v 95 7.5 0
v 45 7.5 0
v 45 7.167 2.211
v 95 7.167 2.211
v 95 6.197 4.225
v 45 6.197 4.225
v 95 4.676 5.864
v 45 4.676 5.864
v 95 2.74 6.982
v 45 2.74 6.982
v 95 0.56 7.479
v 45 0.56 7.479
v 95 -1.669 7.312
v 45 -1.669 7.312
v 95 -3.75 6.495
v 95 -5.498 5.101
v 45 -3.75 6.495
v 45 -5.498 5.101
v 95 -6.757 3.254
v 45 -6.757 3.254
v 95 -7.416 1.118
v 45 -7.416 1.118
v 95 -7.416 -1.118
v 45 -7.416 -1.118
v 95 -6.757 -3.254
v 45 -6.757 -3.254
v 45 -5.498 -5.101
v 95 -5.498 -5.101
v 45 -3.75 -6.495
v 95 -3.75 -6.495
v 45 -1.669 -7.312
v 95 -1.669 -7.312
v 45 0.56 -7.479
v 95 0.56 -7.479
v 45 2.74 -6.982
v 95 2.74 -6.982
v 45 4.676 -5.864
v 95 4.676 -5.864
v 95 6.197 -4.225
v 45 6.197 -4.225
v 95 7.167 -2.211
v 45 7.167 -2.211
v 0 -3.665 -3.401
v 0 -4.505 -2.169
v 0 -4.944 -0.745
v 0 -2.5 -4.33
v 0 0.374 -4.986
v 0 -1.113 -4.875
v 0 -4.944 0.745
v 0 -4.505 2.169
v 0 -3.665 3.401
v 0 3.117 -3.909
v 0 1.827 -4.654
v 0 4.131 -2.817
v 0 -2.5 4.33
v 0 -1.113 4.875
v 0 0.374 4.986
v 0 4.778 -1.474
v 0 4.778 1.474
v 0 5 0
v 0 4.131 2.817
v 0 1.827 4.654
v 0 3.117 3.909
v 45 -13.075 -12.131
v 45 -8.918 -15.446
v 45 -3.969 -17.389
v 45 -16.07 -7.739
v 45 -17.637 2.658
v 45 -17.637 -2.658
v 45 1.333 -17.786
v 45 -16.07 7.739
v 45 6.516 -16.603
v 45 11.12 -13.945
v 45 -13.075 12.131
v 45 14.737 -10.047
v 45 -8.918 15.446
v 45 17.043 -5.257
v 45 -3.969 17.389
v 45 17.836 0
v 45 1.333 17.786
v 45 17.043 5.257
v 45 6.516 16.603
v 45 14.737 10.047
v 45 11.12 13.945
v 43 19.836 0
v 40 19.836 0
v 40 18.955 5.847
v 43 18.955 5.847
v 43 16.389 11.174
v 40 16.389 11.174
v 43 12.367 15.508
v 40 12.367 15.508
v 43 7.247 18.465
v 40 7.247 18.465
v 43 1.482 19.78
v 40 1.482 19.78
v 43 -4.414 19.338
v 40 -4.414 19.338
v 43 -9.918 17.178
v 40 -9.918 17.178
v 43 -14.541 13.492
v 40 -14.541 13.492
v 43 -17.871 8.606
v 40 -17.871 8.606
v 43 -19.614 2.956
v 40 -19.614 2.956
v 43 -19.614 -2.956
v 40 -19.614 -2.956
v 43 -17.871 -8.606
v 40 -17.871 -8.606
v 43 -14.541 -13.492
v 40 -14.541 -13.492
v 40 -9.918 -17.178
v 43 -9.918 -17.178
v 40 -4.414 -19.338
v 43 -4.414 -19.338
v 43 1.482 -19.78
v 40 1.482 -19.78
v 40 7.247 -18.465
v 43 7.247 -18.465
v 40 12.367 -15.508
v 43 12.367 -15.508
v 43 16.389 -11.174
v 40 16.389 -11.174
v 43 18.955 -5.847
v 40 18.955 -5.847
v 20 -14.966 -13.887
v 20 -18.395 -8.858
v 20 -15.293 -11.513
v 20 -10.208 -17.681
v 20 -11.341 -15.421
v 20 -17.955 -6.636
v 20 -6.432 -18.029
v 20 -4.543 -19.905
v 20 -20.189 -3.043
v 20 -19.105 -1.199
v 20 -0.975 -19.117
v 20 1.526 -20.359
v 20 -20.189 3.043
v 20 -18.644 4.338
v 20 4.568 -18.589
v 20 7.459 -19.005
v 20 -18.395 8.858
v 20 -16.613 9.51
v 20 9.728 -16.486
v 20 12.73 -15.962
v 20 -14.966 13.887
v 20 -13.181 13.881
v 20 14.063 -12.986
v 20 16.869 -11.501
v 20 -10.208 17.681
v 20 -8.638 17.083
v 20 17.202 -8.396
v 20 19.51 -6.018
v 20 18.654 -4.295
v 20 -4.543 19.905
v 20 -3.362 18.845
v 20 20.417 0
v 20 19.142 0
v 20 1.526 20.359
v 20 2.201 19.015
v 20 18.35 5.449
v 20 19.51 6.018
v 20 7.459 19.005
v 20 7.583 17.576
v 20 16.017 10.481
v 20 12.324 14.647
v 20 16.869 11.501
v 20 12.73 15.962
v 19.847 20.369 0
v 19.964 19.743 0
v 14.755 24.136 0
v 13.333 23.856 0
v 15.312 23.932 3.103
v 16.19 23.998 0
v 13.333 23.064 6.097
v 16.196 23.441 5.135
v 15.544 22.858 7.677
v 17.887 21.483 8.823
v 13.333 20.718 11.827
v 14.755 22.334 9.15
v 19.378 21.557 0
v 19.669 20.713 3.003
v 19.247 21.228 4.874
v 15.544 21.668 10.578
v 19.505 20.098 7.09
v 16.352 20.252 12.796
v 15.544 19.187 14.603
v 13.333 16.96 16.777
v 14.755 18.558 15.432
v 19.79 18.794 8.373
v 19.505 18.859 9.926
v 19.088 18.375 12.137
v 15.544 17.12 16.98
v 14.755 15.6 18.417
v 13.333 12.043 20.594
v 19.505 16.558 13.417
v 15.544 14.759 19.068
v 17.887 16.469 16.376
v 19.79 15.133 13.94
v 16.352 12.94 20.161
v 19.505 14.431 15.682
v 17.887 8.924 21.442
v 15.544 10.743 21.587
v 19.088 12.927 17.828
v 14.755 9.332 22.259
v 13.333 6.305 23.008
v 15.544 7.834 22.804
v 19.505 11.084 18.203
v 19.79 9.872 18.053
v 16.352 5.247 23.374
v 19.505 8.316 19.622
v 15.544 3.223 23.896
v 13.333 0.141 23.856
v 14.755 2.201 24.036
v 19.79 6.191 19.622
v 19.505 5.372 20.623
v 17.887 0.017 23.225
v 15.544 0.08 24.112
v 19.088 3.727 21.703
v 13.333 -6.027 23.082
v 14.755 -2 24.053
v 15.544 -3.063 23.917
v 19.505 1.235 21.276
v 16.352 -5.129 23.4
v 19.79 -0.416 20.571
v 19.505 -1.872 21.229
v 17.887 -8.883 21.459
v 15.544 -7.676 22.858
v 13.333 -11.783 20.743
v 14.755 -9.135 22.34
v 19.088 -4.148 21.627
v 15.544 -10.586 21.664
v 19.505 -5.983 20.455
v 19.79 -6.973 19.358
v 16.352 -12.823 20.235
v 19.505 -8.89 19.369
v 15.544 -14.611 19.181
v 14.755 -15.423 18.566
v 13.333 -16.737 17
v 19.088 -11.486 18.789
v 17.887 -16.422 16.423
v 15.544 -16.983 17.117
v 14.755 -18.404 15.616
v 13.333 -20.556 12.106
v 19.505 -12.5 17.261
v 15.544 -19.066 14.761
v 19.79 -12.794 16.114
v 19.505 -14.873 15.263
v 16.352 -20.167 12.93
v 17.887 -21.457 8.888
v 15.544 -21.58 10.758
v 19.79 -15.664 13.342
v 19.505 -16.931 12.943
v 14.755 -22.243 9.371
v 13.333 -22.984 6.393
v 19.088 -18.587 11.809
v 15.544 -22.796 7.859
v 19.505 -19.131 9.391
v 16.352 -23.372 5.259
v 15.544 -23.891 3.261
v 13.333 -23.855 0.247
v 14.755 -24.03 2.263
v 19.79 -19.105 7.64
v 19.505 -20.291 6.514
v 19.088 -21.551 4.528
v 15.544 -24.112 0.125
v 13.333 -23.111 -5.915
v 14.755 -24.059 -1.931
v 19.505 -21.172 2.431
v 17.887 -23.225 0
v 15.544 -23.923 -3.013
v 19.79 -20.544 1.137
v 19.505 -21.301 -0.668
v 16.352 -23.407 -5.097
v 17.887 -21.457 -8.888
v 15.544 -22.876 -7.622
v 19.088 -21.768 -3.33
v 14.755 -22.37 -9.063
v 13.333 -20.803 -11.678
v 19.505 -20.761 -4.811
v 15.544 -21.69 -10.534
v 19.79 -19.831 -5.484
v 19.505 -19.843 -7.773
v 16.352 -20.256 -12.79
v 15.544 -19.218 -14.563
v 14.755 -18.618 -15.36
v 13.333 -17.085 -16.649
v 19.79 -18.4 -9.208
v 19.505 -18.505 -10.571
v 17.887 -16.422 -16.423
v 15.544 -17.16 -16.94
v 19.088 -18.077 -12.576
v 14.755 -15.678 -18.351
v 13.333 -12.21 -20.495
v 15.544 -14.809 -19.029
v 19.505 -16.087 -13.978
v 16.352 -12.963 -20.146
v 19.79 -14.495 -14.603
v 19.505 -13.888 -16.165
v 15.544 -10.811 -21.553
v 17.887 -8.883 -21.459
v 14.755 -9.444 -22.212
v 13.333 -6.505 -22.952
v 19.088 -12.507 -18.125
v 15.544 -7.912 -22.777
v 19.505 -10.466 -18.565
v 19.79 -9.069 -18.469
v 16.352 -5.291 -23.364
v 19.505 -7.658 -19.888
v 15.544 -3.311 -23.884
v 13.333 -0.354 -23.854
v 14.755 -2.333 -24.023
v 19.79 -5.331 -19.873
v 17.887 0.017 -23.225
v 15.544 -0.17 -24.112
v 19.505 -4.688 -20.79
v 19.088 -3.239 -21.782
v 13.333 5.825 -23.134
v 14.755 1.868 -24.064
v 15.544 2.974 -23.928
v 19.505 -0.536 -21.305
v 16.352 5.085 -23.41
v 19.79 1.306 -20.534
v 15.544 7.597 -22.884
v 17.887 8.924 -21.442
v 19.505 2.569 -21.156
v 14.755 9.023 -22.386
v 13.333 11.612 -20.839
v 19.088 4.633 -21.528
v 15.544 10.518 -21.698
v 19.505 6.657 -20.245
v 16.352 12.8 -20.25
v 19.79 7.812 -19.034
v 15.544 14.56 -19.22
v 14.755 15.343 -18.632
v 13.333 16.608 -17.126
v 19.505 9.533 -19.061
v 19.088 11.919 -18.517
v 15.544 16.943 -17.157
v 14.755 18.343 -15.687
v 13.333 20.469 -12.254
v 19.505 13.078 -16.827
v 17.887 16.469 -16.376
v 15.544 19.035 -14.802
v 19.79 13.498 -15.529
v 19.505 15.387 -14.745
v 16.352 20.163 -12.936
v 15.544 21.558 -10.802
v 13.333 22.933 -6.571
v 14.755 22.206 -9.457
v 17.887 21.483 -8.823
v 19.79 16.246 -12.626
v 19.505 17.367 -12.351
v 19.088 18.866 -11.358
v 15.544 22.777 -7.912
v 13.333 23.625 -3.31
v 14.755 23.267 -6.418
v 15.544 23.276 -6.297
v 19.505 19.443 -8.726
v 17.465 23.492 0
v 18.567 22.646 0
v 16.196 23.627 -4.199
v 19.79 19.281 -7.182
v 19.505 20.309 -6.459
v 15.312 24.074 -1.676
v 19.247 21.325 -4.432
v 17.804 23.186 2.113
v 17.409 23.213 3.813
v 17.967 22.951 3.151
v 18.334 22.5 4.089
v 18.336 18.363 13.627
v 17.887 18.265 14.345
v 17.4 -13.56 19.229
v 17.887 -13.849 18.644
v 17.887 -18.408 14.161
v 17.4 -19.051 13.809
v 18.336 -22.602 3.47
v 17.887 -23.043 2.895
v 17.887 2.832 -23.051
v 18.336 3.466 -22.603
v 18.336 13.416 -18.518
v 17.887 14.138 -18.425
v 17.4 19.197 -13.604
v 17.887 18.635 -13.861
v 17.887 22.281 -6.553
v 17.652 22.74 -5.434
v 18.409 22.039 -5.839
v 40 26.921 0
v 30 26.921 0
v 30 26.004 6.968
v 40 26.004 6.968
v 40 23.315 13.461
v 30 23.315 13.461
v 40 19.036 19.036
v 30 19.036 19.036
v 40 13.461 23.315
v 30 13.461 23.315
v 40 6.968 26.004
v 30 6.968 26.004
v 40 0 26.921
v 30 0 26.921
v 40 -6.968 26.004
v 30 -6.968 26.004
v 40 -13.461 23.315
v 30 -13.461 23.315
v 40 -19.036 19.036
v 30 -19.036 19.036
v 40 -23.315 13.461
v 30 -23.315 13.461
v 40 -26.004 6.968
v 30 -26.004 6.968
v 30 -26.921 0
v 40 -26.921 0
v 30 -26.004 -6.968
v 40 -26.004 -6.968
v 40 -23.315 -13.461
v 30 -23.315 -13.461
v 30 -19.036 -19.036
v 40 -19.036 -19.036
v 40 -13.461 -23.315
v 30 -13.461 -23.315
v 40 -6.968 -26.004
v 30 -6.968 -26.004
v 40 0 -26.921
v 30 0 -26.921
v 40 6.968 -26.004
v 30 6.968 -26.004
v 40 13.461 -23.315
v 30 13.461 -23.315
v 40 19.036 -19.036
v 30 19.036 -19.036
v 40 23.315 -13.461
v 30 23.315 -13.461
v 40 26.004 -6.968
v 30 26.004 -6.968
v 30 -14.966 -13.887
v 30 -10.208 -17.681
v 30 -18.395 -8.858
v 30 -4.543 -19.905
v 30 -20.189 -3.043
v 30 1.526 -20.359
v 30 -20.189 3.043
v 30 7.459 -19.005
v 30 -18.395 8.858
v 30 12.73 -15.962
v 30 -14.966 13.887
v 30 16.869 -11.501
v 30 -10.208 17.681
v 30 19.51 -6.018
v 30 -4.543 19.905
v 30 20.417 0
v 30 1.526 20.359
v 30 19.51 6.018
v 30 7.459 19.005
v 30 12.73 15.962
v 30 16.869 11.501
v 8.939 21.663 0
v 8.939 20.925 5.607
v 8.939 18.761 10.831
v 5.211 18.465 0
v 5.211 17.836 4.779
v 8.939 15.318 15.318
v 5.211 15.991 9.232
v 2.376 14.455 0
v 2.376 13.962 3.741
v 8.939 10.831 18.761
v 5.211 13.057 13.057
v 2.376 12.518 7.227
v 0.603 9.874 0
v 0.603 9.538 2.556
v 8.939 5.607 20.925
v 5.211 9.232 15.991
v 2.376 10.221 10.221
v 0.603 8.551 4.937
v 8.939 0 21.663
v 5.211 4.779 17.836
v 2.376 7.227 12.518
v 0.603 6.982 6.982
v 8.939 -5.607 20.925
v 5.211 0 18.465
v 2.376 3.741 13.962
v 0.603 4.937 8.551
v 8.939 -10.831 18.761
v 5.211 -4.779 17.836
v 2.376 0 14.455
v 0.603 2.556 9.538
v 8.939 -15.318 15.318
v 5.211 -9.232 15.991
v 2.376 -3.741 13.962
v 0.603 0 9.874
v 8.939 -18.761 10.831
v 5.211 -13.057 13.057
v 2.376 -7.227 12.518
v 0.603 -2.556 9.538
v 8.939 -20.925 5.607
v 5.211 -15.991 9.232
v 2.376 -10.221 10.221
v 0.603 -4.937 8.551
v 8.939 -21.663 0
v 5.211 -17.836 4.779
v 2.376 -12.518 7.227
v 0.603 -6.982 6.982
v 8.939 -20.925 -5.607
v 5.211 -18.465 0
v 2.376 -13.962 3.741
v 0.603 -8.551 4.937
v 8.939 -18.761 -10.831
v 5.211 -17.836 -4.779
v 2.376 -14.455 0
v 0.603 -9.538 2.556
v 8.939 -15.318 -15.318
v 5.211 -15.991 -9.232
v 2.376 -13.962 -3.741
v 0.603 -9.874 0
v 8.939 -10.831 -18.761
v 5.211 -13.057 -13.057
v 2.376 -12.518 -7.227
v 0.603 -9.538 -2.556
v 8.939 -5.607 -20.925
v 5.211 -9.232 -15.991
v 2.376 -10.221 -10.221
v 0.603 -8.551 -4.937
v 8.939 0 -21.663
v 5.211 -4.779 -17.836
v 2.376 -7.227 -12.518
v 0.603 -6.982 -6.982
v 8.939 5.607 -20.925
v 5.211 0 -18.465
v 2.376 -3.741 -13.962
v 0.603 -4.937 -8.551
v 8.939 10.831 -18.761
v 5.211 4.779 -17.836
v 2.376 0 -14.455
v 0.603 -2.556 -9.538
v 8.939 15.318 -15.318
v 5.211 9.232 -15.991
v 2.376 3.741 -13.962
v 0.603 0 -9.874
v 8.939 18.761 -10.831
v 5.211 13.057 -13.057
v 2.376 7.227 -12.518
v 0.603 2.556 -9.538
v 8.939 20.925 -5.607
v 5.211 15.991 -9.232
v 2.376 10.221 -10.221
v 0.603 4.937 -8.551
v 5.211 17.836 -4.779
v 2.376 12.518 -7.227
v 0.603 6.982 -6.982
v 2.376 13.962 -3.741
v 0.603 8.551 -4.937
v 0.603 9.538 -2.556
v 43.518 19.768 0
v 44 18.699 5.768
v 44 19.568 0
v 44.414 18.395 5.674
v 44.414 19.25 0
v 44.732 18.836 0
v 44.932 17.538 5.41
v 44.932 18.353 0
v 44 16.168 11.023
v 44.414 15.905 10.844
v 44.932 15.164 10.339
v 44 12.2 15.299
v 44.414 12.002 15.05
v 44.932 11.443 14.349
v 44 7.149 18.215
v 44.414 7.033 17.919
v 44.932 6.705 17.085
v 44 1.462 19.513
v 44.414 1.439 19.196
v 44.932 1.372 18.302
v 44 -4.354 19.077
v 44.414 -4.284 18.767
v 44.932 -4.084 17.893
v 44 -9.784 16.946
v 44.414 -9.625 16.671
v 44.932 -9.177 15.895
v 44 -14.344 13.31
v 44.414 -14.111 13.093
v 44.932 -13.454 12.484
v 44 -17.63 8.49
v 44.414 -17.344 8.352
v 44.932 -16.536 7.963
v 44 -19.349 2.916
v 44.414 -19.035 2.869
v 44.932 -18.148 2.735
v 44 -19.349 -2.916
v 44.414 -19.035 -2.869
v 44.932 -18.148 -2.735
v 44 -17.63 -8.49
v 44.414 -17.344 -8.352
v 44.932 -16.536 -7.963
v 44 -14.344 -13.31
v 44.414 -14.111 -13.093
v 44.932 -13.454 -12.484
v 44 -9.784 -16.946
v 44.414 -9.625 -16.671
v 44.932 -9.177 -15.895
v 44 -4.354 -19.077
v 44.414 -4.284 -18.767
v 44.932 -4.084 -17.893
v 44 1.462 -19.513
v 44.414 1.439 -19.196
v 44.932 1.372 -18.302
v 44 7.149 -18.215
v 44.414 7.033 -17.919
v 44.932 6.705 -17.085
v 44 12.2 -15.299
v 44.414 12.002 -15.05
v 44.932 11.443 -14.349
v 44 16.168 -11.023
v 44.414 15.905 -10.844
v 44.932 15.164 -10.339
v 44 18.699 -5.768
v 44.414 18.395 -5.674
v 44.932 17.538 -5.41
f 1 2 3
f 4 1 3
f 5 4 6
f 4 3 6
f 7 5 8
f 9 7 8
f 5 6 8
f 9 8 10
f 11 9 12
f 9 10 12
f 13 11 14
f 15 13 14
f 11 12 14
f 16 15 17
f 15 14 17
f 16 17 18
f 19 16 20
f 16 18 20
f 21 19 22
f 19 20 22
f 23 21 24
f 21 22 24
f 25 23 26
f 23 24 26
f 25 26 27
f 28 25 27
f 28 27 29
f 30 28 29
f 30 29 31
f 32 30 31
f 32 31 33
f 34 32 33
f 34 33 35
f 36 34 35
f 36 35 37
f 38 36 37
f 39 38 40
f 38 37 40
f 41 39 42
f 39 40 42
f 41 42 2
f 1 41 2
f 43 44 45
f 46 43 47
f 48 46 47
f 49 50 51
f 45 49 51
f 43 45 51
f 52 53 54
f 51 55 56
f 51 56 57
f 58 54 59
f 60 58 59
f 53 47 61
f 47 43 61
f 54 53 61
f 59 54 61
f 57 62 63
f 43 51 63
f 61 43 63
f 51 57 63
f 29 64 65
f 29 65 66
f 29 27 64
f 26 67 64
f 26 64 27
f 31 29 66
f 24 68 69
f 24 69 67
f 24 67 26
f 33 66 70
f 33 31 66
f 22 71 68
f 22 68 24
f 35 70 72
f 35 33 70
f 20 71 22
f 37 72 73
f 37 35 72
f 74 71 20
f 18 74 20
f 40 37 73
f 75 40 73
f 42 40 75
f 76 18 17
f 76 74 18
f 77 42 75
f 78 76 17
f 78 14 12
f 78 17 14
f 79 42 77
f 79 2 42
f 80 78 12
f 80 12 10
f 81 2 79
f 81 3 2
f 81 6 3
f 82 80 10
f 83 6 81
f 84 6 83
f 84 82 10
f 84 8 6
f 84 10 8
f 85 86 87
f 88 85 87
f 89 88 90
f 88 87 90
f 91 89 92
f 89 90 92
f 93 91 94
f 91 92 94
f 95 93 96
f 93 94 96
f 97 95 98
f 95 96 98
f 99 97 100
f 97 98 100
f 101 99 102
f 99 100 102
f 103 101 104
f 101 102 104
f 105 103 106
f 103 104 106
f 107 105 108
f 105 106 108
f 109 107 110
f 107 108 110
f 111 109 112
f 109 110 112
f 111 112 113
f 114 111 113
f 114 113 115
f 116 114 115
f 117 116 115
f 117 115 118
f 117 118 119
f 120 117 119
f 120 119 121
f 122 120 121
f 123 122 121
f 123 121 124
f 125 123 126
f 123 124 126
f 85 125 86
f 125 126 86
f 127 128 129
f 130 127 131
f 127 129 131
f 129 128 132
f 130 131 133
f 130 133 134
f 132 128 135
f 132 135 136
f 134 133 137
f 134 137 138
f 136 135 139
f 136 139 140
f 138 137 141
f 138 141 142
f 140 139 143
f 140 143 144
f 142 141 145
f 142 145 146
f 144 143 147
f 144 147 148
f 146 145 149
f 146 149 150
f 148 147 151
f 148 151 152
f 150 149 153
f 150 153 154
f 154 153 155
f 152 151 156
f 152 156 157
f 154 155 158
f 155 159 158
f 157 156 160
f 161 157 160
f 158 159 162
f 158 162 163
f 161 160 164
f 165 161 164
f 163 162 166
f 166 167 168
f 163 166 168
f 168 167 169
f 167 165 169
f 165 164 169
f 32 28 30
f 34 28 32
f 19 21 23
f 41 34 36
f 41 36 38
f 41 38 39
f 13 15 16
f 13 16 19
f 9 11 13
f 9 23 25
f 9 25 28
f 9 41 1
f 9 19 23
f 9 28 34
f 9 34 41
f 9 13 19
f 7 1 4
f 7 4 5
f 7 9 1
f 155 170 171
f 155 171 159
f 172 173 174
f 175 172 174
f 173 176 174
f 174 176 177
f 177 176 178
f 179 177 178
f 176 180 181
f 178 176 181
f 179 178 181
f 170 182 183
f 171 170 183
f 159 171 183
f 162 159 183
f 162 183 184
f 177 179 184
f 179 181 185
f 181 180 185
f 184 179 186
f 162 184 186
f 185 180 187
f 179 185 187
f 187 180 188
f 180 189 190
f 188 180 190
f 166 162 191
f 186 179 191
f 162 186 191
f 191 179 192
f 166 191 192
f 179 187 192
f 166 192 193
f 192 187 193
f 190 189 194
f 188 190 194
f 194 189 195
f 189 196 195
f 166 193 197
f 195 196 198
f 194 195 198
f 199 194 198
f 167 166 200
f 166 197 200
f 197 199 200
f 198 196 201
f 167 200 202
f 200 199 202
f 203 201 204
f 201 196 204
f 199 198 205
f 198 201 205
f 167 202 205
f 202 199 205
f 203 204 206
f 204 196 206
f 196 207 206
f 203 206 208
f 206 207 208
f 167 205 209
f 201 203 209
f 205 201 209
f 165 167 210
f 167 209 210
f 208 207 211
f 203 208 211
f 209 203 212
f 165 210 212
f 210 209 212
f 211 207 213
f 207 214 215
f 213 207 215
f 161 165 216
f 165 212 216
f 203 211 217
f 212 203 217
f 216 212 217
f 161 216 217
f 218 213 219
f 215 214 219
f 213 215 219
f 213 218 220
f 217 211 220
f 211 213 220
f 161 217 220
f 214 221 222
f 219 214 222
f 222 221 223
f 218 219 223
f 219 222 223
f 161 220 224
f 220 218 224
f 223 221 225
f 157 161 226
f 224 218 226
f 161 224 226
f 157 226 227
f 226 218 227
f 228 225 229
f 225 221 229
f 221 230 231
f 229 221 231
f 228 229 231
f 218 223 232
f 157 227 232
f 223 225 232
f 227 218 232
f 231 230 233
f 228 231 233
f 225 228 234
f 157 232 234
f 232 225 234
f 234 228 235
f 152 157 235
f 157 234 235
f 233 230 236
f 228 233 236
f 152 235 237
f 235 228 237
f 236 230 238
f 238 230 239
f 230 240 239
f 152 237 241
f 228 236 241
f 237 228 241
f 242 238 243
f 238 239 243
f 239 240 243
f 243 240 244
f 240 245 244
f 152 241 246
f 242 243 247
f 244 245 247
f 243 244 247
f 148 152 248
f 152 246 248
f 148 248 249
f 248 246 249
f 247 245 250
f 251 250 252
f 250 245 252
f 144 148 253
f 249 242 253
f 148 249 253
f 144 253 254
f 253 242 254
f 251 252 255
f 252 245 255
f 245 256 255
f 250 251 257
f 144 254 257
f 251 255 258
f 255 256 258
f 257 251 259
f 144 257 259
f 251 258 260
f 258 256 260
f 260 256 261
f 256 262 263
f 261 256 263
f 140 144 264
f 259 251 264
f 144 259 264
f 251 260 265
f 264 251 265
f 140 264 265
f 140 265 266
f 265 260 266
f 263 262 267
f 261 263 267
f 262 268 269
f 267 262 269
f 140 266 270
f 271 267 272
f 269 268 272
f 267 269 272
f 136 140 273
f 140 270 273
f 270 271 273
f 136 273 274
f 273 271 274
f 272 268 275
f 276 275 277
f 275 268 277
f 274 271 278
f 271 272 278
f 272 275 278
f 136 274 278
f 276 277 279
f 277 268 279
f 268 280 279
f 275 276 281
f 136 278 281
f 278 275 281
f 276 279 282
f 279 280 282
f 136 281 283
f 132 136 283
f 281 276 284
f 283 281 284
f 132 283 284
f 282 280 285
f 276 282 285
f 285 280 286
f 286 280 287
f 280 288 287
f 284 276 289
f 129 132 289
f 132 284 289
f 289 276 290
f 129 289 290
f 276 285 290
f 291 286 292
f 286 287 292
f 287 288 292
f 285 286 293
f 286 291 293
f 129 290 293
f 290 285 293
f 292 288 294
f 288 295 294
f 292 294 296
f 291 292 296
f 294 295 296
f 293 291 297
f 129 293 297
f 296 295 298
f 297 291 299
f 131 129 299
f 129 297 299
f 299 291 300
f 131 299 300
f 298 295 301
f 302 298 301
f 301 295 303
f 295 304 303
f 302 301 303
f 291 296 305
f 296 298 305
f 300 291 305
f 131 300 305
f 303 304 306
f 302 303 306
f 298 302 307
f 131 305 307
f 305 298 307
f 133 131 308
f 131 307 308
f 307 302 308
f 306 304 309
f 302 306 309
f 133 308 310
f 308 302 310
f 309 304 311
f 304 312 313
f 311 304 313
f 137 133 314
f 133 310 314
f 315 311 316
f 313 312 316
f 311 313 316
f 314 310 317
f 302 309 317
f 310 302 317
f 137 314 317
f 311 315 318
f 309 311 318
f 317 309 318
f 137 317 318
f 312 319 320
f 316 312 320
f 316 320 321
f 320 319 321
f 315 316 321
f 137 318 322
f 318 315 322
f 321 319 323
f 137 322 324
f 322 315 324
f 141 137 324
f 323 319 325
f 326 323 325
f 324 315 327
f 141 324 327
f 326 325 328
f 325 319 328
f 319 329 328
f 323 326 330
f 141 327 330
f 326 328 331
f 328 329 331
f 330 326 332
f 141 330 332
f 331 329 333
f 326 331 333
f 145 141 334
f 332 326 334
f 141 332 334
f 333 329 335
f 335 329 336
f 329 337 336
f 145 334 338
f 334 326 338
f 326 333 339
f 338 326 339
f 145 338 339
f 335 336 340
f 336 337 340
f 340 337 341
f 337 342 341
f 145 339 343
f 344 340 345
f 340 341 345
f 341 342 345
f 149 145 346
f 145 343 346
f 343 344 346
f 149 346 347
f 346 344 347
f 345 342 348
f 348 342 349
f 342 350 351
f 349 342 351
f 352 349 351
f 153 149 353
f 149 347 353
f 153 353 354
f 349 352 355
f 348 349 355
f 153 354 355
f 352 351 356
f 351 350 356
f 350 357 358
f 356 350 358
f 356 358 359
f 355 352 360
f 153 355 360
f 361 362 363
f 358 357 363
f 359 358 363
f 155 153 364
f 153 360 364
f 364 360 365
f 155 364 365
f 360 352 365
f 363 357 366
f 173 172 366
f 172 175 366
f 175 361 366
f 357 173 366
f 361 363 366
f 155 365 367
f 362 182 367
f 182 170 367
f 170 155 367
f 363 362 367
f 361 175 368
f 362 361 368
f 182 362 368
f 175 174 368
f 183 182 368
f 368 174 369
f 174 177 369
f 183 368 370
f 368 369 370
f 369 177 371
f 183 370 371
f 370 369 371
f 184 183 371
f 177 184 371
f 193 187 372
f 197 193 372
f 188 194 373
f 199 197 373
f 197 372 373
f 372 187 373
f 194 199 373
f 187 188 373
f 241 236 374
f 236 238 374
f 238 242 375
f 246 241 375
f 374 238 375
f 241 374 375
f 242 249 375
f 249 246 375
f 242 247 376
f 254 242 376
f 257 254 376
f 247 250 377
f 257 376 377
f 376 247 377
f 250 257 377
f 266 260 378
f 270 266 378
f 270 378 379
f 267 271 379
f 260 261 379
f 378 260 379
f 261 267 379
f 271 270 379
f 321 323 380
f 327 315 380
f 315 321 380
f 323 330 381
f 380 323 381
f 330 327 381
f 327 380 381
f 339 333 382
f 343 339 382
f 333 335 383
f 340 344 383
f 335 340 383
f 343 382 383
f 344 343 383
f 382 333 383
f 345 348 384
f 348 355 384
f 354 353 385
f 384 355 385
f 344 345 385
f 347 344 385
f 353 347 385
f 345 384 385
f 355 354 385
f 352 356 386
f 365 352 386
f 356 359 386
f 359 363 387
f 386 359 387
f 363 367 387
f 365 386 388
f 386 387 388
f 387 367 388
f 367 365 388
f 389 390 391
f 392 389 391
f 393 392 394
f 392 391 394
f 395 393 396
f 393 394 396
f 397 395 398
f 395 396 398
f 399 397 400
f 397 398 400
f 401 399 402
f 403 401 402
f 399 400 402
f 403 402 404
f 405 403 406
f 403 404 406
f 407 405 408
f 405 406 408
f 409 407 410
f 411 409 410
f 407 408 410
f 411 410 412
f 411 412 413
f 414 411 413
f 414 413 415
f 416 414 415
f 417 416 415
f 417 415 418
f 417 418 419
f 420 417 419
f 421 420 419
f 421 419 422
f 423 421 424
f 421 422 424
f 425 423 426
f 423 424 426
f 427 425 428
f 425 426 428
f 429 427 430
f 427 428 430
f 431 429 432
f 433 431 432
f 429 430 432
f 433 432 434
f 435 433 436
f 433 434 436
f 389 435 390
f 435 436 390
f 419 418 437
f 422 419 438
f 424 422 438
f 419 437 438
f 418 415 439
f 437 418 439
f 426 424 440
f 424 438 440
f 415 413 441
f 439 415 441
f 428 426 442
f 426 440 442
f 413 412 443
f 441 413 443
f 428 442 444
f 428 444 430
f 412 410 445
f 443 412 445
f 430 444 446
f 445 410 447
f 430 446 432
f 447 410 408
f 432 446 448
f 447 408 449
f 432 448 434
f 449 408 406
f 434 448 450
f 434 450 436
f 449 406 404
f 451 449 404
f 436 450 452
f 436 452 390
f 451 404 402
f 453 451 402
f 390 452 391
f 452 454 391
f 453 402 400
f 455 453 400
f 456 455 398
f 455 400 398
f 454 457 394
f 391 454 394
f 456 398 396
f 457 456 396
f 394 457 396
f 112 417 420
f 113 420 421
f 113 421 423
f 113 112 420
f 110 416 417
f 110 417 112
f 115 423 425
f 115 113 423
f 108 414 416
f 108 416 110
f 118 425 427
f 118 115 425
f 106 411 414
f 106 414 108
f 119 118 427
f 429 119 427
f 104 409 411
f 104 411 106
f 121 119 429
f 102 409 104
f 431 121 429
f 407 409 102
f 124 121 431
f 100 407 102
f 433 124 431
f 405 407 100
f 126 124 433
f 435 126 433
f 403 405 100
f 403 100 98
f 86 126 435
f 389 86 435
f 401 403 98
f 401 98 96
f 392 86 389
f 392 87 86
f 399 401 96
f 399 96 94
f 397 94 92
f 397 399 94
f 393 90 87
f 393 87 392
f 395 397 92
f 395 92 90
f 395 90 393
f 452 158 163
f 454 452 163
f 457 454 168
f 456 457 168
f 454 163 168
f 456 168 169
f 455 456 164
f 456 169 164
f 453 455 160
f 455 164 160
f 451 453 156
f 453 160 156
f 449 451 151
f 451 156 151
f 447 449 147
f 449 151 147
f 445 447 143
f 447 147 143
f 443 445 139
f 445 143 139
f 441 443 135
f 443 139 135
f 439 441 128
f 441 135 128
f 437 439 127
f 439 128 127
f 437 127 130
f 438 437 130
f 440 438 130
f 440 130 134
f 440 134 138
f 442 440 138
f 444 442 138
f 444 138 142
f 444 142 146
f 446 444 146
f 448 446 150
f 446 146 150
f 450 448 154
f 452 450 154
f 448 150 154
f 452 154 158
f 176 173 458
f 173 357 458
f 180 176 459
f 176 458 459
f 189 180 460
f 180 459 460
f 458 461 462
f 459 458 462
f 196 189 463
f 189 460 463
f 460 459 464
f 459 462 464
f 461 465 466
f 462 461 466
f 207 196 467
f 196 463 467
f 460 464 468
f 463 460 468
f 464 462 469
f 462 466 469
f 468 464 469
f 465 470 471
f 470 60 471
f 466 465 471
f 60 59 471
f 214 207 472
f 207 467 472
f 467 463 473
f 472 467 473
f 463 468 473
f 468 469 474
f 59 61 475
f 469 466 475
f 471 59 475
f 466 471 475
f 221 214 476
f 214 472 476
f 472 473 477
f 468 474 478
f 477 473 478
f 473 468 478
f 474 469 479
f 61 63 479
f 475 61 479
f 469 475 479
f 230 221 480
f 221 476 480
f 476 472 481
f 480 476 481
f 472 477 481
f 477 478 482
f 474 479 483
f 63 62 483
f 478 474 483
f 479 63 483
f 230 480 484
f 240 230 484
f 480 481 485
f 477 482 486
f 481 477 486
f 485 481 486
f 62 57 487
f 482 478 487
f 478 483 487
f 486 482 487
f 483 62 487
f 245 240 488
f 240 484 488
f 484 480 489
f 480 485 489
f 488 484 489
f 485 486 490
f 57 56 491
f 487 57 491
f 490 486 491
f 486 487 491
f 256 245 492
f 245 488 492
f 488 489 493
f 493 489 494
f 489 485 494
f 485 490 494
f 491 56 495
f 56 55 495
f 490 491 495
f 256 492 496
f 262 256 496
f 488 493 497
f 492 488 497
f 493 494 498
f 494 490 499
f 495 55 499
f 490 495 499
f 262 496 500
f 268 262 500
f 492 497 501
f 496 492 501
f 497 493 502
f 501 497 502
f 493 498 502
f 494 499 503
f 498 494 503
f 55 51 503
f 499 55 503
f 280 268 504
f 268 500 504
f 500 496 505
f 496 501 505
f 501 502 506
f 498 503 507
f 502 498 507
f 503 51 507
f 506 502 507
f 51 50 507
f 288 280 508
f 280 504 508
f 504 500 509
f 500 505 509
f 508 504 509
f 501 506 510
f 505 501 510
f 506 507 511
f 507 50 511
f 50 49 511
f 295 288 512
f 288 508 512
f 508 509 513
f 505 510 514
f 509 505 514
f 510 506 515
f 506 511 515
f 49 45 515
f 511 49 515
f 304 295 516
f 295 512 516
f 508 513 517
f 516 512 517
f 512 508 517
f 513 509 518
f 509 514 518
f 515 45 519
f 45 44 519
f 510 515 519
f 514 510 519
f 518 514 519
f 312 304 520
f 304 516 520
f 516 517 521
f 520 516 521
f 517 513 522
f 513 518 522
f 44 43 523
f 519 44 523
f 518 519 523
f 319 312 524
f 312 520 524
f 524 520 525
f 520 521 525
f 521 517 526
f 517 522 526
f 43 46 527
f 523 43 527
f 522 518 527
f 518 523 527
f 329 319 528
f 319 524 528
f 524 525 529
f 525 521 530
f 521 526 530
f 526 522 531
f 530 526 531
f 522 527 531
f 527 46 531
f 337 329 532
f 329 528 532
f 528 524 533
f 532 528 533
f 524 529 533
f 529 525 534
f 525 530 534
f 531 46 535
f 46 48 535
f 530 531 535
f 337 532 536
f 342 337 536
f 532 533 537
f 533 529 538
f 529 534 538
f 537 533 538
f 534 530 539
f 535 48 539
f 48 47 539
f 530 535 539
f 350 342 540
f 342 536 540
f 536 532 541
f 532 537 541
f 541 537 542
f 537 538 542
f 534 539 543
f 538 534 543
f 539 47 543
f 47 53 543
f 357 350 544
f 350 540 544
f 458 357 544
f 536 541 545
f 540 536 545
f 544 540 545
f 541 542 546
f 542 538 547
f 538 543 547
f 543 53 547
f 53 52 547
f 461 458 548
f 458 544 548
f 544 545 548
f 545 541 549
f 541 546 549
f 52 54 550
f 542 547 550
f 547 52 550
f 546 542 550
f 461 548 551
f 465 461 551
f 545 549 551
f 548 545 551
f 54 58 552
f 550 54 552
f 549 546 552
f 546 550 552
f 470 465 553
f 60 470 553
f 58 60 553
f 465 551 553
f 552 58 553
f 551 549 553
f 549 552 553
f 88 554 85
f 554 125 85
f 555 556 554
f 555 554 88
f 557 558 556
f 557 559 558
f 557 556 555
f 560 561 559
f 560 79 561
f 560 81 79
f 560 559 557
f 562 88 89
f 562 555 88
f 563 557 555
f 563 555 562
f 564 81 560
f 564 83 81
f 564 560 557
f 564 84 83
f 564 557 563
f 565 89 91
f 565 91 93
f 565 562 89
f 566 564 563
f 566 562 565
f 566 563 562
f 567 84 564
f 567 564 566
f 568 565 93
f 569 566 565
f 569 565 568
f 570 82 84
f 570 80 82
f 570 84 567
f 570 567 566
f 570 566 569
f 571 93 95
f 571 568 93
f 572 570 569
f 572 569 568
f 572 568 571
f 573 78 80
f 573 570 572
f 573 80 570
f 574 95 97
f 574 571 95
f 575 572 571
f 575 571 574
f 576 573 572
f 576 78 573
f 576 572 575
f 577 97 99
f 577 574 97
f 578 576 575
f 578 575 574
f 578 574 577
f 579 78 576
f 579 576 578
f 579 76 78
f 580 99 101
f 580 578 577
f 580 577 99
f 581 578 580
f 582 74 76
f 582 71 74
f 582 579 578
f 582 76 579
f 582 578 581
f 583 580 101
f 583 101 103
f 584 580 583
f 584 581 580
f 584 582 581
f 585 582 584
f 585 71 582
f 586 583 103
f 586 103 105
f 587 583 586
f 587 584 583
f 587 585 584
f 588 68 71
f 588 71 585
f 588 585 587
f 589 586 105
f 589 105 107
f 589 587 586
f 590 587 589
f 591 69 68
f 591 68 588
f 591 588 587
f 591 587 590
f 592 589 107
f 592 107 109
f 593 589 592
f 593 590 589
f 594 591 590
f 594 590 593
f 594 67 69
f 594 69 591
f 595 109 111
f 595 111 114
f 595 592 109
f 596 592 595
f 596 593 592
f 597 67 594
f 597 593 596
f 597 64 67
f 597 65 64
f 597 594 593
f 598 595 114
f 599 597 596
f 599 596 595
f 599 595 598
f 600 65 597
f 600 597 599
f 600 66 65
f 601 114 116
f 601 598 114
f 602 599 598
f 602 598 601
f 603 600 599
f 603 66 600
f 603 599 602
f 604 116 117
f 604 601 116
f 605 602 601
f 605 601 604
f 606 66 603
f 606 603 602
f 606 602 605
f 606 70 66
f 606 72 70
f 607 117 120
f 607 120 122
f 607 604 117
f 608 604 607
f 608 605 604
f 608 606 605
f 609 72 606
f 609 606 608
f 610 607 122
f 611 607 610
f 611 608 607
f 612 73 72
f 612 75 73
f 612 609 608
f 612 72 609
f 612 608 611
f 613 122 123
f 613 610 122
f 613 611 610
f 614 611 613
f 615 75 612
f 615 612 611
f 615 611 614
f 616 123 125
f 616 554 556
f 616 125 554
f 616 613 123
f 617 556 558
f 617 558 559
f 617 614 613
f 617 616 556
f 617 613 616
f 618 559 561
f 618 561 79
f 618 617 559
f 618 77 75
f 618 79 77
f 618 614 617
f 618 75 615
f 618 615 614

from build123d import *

# Parameters (mm, degrees)
F0_R      = 25
F1_DEPTH  = 20
F2_R      = 19.99999
F3_R      = 5
F4_R      = 20.4165647278
F5_DEPTH  = 10
F6_R      = 26.9213297652
F7_DEPTH  = 10
F8_R      = 19.8358108325
F9_DEPTH  = 5
F10_R     = 2
F11_R     = 7.5
F12_DEPTH = 50


# Not quite as in the source:
# - a fillet or chamfer is up to 0.001 mm smaller than in the source, because OpenCascade refuses the exact size


with BuildPart() as f1:
    # F0 (on Right) → F1 (new body)
    with BuildSketch(Plane.YZ):
        Circle(F0_R)
    extrude(amount=F1_DEPTH)

    # F2 (radius 20 in the source; OpenCascade refuses exactly that, so slightly less here)
    f2_edges = [f1.edges().sort_by_distance(p)[0] for p in [
        (0, -25, 0),
    ]]
    fillet(f2_edges, radius=F2_R)

    # F3
    f3_edges = [f1.edges().sort_by_distance(p)[0] for p in [
        (20, -25, 0),
    ]]
    fillet(f3_edges, radius=F3_R)

    # F4 (on face) → F5 (join)
    with BuildSketch(Plane.YZ.offset(20)):
        Circle(F4_R)
    extrude(amount=F5_DEPTH)

    # F6 (on face) → F7 (join)
    with BuildSketch(Plane.YZ.offset(30)):
        Circle(F6_R)
    extrude(amount=F7_DEPTH)

    # F8 (on face) → F9 (join)
    with BuildSketch(Plane.YZ.offset(40)):
        Circle(F8_R)
    extrude(amount=F9_DEPTH)

    # F10
    f10_edges = [f1.edges().sort_by_distance(p)[0] for p in [
        (45, -19.835811, 0),
    ]]
    fillet(f10_edges, radius=F10_R)

    # F11 (on face) → F12 (join)
    with BuildSketch(Plane.YZ.offset(45)):
        Circle(F11_R)
    extrude(amount=F12_DEPTH)


solid = f1.part
